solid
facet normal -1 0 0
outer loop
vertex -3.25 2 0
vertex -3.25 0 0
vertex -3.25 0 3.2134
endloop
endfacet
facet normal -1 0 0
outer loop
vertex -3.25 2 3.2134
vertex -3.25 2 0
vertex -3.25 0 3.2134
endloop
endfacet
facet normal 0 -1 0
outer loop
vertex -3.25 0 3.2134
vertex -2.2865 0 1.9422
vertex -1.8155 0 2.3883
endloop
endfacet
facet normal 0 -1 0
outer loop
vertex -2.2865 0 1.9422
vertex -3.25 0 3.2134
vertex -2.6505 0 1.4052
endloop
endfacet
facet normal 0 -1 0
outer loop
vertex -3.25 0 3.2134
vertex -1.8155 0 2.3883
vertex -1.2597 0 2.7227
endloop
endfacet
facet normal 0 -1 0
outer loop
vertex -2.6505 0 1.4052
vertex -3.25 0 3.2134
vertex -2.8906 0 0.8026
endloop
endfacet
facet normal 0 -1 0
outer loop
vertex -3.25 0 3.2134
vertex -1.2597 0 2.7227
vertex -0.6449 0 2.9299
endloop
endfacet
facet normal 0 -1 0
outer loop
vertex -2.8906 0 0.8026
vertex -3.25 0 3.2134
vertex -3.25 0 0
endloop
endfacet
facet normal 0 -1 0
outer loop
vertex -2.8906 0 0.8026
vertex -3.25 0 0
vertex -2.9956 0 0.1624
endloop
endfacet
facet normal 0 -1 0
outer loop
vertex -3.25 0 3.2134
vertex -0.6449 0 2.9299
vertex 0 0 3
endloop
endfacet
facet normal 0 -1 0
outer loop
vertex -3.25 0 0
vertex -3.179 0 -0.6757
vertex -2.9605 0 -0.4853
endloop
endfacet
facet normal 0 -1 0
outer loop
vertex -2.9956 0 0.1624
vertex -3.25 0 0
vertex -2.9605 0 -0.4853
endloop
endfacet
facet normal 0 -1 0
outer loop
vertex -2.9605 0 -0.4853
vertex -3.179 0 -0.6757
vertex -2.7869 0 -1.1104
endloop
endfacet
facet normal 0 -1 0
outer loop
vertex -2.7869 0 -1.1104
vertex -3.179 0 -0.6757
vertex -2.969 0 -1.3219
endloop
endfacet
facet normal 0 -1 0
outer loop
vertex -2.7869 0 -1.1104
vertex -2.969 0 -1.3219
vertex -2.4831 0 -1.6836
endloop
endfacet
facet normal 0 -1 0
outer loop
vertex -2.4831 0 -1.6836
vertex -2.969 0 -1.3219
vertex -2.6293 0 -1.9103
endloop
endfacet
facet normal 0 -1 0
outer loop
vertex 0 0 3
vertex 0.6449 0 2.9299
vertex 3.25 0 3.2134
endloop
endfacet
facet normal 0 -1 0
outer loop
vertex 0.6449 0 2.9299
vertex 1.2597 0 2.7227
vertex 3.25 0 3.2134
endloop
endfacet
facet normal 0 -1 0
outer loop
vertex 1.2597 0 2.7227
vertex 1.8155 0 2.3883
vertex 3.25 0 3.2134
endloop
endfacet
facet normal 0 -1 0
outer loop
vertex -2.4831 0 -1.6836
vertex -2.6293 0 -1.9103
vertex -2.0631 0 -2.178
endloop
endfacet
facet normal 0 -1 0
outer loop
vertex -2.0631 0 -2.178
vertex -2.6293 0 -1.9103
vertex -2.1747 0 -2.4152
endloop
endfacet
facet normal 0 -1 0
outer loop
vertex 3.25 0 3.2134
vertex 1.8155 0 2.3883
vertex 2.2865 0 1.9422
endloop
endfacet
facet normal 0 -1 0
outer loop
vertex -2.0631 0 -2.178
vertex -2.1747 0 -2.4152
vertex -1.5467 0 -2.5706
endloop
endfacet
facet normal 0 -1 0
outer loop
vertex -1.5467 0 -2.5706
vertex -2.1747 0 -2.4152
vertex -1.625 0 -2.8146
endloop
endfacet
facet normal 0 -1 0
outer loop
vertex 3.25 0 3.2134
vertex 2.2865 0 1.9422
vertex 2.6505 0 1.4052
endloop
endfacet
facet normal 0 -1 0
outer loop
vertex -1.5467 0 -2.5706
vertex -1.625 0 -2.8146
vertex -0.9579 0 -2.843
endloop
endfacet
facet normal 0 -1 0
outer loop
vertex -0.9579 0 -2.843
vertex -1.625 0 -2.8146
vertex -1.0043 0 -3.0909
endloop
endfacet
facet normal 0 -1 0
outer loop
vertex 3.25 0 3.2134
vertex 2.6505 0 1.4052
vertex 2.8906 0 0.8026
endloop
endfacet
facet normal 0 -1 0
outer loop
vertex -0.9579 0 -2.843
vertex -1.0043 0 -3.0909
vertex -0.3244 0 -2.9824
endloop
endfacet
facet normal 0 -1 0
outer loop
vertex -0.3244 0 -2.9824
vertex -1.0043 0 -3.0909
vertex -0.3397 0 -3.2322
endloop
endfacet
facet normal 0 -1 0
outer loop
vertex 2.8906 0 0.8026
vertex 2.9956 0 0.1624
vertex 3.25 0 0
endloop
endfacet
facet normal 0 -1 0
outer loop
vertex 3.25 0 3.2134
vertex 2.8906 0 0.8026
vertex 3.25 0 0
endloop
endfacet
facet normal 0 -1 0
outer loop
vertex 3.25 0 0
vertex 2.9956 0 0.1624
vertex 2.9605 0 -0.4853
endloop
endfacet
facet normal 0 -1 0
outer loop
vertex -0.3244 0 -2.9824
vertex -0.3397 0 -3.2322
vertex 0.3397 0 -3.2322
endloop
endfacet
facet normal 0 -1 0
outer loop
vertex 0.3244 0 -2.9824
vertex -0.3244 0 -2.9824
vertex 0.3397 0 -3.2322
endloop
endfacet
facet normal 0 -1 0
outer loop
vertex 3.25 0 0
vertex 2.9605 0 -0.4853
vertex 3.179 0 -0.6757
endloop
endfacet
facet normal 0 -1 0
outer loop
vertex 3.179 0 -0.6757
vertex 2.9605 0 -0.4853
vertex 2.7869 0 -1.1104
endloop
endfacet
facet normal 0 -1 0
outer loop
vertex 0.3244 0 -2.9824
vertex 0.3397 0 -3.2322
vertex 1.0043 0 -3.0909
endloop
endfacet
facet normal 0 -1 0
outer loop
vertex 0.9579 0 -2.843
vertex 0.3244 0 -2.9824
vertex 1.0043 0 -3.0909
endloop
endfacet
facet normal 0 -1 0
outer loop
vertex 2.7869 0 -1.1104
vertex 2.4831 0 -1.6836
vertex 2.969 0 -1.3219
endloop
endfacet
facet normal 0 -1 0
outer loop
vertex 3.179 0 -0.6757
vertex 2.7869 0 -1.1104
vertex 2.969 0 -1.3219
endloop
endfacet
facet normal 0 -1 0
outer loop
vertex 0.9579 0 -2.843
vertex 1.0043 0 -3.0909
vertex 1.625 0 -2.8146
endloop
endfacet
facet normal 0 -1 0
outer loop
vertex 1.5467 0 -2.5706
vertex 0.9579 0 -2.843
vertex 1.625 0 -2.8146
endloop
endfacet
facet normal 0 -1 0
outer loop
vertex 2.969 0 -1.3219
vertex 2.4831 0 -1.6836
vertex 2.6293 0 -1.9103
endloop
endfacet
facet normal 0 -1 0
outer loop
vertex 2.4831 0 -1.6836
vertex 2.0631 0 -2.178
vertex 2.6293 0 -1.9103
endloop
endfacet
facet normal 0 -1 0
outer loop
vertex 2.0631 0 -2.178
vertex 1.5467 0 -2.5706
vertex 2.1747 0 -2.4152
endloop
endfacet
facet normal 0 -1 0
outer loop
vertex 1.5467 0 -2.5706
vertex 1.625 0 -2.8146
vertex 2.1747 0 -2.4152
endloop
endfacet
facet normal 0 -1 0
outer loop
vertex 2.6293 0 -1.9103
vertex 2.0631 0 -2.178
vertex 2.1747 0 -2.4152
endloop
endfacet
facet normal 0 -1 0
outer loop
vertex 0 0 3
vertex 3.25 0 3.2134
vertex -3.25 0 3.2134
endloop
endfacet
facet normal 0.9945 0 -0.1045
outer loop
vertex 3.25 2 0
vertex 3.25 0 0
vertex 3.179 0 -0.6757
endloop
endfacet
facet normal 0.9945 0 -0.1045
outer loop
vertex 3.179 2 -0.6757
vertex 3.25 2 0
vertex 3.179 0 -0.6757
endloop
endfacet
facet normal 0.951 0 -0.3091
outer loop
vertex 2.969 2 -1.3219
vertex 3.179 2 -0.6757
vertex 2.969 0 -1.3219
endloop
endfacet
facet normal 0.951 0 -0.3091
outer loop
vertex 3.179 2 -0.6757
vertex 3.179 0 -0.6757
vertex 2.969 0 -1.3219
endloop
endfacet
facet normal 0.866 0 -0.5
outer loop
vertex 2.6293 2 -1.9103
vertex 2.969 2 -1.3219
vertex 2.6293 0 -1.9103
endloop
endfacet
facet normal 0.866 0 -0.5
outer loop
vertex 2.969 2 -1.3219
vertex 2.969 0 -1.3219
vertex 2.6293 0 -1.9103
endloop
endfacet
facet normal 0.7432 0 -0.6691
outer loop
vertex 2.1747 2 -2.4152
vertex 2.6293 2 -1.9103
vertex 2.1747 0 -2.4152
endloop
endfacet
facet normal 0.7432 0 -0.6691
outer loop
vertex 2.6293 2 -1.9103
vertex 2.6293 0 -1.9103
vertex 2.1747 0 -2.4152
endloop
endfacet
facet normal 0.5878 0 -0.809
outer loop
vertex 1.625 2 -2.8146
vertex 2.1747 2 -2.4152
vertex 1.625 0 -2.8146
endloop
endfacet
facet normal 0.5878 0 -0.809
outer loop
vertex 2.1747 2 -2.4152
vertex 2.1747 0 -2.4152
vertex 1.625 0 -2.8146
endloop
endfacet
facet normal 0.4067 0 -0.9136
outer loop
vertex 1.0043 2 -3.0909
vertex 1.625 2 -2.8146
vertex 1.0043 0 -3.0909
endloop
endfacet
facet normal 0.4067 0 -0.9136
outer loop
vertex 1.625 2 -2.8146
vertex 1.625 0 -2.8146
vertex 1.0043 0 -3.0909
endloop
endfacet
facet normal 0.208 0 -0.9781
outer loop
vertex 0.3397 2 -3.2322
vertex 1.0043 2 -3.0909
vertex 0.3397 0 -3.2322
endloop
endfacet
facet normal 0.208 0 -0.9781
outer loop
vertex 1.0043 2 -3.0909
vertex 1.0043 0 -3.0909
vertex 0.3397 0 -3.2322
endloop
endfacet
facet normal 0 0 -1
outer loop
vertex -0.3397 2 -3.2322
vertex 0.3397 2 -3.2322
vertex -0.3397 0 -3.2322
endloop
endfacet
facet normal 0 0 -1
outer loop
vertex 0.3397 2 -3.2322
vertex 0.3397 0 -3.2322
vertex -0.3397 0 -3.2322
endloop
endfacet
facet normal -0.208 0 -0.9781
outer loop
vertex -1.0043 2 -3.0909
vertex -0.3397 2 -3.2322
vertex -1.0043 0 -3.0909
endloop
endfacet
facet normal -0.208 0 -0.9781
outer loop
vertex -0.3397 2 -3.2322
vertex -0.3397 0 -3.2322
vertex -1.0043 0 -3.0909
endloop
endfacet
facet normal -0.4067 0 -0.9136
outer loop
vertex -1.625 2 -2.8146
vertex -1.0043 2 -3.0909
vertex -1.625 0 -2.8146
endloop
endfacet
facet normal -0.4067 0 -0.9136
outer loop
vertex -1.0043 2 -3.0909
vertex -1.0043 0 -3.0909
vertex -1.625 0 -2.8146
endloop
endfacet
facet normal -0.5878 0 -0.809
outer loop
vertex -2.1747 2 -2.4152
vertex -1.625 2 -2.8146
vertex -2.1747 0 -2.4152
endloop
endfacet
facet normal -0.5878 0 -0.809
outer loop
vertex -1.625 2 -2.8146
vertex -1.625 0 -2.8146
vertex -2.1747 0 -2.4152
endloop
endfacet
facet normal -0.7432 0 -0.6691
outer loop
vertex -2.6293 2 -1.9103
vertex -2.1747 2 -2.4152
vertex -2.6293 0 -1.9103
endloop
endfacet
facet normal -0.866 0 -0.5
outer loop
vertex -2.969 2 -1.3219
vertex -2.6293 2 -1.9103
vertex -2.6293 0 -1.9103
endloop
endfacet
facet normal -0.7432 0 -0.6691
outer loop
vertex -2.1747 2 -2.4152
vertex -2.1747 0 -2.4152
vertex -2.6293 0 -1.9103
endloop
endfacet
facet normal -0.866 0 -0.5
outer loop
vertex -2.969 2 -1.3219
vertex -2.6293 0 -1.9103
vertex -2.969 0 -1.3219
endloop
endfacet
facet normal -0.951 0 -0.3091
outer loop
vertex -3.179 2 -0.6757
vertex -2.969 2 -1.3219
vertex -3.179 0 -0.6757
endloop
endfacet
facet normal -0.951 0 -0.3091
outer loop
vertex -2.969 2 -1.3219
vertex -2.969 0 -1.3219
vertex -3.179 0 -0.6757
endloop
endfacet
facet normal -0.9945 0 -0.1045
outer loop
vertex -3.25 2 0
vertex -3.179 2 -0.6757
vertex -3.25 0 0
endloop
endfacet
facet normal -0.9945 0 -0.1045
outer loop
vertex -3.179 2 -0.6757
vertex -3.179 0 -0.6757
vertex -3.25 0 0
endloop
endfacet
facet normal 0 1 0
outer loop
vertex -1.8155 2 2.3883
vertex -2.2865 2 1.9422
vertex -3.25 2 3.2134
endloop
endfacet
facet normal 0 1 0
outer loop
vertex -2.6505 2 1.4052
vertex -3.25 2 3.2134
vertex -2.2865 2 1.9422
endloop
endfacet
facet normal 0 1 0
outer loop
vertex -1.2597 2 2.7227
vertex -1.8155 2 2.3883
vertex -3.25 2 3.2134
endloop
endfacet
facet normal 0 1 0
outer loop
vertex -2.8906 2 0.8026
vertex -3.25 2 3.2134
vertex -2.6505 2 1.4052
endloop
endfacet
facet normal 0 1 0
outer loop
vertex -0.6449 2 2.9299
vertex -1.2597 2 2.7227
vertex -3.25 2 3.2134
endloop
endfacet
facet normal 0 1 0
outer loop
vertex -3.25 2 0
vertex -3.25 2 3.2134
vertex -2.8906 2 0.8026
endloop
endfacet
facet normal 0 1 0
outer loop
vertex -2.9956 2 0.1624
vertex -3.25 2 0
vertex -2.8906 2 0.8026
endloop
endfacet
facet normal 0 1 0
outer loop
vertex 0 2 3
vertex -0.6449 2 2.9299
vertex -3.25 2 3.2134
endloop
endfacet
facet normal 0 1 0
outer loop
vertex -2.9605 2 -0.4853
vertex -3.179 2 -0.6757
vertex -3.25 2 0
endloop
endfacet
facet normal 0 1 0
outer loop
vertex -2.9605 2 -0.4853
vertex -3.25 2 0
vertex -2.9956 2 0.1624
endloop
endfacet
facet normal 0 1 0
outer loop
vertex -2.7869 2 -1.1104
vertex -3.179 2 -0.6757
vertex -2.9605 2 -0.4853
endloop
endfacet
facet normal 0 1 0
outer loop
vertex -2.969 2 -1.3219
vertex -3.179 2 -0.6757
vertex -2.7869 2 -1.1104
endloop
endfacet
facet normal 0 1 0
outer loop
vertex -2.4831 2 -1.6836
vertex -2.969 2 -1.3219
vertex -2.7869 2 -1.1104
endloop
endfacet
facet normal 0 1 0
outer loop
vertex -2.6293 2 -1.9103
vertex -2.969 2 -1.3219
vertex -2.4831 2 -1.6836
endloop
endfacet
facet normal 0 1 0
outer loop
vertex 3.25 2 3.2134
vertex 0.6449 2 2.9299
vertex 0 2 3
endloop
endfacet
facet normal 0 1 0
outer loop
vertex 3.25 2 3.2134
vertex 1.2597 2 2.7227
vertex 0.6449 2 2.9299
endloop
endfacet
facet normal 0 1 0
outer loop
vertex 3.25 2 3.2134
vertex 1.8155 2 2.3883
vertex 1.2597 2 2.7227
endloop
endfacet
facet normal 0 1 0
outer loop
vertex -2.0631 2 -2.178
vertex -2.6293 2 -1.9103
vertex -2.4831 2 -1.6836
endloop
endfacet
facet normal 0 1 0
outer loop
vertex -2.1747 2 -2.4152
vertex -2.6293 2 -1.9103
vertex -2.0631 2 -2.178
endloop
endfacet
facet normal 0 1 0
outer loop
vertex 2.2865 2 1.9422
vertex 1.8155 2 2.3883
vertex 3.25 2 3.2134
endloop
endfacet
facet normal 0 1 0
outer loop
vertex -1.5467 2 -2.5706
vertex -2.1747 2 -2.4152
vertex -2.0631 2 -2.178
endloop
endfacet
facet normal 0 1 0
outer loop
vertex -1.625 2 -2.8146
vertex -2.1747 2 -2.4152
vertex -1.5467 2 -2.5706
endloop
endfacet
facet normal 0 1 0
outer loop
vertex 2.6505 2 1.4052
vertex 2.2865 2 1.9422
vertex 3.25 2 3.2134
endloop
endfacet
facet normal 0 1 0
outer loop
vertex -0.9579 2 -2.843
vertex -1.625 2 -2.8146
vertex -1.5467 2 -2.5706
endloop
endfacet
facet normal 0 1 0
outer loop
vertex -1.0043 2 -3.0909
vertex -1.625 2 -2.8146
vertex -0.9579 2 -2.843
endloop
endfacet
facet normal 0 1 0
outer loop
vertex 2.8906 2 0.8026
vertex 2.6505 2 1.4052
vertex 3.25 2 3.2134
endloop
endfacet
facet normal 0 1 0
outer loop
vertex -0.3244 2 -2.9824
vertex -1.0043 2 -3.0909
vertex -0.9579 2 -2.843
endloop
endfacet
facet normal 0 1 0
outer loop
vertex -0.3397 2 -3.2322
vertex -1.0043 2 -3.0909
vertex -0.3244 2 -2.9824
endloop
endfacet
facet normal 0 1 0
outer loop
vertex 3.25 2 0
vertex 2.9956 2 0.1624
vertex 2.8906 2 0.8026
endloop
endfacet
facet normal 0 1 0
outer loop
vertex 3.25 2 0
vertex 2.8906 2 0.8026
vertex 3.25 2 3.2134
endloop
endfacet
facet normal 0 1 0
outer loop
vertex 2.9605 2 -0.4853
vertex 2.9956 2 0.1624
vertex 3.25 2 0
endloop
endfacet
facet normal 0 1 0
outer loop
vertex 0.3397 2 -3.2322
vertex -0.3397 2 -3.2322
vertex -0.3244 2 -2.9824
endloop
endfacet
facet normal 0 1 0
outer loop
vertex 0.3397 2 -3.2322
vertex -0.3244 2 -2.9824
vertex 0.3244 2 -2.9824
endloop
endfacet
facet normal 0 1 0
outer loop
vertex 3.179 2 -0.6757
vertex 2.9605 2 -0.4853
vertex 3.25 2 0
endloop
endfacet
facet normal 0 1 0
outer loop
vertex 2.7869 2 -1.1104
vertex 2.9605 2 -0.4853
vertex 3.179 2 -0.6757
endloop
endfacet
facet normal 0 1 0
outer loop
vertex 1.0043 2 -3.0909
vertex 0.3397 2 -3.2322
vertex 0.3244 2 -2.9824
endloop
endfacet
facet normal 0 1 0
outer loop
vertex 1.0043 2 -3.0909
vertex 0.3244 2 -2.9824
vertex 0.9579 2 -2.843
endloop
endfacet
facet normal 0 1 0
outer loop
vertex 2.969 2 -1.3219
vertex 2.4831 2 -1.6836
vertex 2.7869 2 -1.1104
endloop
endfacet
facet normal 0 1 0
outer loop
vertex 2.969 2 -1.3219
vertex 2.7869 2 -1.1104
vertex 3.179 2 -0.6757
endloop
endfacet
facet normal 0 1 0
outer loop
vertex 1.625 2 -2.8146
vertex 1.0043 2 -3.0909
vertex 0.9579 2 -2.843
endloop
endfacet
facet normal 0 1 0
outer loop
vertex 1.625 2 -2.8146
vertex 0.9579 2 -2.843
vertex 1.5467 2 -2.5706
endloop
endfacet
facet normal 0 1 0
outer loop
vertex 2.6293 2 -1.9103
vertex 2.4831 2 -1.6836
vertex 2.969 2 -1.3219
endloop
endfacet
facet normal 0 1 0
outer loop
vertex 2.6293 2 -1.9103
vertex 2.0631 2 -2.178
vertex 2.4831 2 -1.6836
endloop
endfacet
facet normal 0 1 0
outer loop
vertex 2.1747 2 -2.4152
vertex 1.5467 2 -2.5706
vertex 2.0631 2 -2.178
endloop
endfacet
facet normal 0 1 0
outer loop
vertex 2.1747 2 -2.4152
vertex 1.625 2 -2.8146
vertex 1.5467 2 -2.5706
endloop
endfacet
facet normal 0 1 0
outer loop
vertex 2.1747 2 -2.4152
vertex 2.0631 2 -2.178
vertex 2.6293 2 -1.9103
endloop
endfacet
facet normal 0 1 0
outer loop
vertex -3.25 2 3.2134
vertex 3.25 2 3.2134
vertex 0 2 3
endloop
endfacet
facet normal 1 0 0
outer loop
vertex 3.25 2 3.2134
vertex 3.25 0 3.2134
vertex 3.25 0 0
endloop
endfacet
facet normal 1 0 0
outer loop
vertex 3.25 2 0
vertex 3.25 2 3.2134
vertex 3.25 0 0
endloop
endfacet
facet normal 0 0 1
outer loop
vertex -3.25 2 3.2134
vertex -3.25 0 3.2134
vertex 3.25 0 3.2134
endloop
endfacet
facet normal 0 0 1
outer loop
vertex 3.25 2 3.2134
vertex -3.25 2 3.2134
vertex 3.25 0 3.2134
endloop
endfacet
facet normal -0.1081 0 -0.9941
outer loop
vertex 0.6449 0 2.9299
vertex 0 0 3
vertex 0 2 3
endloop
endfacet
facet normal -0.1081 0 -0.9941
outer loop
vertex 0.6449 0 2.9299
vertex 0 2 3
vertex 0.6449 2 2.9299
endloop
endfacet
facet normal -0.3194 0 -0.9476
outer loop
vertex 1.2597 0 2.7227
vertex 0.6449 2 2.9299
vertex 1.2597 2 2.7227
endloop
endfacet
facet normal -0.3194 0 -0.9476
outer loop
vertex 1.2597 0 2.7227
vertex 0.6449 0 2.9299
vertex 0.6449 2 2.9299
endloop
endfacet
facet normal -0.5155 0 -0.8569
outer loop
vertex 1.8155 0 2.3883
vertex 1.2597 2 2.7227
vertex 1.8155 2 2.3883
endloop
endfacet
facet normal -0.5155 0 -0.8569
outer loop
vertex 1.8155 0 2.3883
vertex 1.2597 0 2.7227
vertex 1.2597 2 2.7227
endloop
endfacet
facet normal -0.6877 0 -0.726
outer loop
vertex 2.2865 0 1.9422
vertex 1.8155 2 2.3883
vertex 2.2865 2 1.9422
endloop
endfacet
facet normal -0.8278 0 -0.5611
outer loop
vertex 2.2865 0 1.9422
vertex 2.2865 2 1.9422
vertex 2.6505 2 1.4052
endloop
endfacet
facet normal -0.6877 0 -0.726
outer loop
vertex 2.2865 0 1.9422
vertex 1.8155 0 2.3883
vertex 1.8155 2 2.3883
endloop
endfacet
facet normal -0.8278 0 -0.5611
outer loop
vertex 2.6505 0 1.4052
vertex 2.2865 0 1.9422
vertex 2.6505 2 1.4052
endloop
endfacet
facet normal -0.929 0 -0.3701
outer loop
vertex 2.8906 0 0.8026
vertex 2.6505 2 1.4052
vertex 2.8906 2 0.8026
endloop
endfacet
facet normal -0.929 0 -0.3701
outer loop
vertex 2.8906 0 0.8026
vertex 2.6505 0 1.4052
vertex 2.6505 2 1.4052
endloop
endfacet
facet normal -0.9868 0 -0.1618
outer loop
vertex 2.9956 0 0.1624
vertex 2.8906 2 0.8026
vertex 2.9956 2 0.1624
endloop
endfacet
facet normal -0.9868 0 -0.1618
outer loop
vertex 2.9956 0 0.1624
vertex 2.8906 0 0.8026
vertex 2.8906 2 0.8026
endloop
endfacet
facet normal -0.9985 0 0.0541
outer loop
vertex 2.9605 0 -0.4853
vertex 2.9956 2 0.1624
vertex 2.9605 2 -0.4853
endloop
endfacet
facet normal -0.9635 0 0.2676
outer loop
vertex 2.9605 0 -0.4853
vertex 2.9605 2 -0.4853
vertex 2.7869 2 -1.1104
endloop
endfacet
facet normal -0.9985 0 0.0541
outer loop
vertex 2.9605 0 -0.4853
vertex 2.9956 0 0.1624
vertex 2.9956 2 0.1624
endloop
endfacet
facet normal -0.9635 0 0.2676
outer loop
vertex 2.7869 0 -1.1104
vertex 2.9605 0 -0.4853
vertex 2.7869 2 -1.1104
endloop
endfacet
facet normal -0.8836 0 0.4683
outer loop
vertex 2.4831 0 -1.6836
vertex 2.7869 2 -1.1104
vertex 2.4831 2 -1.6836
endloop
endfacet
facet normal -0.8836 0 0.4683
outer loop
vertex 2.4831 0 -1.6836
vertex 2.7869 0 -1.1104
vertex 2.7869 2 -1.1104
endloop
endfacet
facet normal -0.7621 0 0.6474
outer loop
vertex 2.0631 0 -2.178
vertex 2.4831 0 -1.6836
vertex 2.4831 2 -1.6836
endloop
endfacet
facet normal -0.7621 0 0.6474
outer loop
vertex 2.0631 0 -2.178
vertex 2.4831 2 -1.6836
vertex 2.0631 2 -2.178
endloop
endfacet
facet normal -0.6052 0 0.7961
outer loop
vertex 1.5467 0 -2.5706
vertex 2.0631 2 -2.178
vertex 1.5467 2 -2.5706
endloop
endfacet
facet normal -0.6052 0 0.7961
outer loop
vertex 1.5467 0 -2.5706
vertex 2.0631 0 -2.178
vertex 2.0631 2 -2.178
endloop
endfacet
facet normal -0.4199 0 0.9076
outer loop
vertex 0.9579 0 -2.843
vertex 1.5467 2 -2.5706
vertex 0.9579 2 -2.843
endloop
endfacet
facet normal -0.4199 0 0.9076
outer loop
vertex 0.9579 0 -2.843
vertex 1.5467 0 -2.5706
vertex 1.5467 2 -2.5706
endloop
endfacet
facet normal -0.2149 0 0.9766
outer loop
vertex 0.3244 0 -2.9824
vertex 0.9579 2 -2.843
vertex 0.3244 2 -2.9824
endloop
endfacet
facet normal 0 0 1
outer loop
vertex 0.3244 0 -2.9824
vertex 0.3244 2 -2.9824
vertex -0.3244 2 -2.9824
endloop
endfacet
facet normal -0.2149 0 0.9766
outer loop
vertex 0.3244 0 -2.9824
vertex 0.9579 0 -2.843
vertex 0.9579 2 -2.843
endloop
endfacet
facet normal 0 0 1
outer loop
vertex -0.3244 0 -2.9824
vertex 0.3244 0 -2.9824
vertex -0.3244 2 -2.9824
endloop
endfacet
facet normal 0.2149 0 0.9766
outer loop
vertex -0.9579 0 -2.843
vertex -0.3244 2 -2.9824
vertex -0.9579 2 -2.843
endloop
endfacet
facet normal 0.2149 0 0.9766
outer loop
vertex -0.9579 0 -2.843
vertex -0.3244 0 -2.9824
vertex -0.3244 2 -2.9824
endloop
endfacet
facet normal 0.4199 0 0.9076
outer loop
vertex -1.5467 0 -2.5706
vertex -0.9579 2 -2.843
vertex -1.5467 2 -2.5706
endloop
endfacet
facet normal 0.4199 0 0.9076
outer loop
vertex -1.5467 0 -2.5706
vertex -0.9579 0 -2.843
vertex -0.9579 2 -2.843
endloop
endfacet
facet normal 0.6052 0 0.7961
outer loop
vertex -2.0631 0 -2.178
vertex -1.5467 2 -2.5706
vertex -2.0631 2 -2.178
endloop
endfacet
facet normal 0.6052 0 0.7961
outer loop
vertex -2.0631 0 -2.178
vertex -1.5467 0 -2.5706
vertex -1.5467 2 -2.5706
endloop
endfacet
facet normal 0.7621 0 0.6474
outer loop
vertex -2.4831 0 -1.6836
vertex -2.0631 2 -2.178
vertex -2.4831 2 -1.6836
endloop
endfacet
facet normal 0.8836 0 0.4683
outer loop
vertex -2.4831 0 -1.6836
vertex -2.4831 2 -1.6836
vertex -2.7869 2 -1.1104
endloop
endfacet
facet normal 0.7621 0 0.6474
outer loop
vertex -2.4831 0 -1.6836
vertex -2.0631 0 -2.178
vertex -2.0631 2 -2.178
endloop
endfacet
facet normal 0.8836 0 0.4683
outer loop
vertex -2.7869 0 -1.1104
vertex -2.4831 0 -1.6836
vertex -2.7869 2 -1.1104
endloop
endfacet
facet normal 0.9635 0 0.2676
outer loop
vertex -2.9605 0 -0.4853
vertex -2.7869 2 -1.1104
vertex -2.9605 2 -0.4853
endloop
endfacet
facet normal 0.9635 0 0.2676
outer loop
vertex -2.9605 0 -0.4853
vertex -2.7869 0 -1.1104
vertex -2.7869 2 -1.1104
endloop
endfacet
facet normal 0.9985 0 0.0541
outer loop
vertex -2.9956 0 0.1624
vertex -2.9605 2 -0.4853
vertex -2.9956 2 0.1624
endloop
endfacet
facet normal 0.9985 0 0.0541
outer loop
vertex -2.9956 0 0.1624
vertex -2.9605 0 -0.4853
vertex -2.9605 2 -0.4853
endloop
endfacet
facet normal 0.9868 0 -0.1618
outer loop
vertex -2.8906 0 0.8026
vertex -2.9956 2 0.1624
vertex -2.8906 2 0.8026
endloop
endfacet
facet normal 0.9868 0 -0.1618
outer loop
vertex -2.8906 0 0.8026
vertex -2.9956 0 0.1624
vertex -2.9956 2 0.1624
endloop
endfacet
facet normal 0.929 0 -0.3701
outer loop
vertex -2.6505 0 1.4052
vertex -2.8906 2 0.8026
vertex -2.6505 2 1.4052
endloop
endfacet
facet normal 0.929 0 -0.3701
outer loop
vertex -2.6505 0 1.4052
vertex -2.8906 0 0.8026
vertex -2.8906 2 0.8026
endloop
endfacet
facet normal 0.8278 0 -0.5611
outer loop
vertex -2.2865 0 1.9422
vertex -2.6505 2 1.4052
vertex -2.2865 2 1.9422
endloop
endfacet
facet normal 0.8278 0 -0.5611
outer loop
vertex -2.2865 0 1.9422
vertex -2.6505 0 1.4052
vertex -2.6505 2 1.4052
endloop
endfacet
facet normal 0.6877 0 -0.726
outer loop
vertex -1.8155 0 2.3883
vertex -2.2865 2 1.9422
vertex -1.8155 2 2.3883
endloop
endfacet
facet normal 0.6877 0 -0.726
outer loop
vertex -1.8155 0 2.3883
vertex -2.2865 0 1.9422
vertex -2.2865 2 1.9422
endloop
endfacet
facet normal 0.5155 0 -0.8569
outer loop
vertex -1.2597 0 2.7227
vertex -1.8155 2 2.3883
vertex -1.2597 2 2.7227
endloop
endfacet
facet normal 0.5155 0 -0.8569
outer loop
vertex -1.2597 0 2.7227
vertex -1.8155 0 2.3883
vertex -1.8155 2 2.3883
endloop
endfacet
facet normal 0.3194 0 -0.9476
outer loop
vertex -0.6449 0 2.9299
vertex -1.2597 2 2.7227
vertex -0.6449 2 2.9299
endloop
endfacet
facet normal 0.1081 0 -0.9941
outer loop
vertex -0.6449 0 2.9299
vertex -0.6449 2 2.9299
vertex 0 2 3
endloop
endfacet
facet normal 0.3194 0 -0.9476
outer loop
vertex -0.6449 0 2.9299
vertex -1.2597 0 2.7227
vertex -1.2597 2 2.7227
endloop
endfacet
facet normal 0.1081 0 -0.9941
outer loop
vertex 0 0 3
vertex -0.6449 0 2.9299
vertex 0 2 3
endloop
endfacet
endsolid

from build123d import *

# Parameters (mm, degrees)
SKETCH1_R           = 3
BOSS_EXTRUDE1_DEPTH = 2


with BuildPart() as part:
    # Sketch1 → Boss-Extrude1 (new body)
    with BuildSketch(Plane(origin=(0, 0, 0), x_dir=(1, 0, 0), z_dir=(0, 1, 0))):
        with BuildLine():
            Line((-3.25, 0), (-3.25, -3.213400023))
            Line((-3.25, -3.213400023), (0.25, -3.213400023))
            Line((0.25, -3.213400023), (3.25, -3.213400023))
            Line((3.25, -3.213400023), (3.25, 0))
            ThreePointArc((3.25, 0), (0, 3.25), (-3.25, 0))
        make_face()
        with Locations(Location((0, 0, 0), (0, 0, 270))):
            Circle(SKETCH1_R, mode=Mode.SUBTRACT)
    extrude(amount=BOSS_EXTRUDE1_DEPTH)


solid = part.part
